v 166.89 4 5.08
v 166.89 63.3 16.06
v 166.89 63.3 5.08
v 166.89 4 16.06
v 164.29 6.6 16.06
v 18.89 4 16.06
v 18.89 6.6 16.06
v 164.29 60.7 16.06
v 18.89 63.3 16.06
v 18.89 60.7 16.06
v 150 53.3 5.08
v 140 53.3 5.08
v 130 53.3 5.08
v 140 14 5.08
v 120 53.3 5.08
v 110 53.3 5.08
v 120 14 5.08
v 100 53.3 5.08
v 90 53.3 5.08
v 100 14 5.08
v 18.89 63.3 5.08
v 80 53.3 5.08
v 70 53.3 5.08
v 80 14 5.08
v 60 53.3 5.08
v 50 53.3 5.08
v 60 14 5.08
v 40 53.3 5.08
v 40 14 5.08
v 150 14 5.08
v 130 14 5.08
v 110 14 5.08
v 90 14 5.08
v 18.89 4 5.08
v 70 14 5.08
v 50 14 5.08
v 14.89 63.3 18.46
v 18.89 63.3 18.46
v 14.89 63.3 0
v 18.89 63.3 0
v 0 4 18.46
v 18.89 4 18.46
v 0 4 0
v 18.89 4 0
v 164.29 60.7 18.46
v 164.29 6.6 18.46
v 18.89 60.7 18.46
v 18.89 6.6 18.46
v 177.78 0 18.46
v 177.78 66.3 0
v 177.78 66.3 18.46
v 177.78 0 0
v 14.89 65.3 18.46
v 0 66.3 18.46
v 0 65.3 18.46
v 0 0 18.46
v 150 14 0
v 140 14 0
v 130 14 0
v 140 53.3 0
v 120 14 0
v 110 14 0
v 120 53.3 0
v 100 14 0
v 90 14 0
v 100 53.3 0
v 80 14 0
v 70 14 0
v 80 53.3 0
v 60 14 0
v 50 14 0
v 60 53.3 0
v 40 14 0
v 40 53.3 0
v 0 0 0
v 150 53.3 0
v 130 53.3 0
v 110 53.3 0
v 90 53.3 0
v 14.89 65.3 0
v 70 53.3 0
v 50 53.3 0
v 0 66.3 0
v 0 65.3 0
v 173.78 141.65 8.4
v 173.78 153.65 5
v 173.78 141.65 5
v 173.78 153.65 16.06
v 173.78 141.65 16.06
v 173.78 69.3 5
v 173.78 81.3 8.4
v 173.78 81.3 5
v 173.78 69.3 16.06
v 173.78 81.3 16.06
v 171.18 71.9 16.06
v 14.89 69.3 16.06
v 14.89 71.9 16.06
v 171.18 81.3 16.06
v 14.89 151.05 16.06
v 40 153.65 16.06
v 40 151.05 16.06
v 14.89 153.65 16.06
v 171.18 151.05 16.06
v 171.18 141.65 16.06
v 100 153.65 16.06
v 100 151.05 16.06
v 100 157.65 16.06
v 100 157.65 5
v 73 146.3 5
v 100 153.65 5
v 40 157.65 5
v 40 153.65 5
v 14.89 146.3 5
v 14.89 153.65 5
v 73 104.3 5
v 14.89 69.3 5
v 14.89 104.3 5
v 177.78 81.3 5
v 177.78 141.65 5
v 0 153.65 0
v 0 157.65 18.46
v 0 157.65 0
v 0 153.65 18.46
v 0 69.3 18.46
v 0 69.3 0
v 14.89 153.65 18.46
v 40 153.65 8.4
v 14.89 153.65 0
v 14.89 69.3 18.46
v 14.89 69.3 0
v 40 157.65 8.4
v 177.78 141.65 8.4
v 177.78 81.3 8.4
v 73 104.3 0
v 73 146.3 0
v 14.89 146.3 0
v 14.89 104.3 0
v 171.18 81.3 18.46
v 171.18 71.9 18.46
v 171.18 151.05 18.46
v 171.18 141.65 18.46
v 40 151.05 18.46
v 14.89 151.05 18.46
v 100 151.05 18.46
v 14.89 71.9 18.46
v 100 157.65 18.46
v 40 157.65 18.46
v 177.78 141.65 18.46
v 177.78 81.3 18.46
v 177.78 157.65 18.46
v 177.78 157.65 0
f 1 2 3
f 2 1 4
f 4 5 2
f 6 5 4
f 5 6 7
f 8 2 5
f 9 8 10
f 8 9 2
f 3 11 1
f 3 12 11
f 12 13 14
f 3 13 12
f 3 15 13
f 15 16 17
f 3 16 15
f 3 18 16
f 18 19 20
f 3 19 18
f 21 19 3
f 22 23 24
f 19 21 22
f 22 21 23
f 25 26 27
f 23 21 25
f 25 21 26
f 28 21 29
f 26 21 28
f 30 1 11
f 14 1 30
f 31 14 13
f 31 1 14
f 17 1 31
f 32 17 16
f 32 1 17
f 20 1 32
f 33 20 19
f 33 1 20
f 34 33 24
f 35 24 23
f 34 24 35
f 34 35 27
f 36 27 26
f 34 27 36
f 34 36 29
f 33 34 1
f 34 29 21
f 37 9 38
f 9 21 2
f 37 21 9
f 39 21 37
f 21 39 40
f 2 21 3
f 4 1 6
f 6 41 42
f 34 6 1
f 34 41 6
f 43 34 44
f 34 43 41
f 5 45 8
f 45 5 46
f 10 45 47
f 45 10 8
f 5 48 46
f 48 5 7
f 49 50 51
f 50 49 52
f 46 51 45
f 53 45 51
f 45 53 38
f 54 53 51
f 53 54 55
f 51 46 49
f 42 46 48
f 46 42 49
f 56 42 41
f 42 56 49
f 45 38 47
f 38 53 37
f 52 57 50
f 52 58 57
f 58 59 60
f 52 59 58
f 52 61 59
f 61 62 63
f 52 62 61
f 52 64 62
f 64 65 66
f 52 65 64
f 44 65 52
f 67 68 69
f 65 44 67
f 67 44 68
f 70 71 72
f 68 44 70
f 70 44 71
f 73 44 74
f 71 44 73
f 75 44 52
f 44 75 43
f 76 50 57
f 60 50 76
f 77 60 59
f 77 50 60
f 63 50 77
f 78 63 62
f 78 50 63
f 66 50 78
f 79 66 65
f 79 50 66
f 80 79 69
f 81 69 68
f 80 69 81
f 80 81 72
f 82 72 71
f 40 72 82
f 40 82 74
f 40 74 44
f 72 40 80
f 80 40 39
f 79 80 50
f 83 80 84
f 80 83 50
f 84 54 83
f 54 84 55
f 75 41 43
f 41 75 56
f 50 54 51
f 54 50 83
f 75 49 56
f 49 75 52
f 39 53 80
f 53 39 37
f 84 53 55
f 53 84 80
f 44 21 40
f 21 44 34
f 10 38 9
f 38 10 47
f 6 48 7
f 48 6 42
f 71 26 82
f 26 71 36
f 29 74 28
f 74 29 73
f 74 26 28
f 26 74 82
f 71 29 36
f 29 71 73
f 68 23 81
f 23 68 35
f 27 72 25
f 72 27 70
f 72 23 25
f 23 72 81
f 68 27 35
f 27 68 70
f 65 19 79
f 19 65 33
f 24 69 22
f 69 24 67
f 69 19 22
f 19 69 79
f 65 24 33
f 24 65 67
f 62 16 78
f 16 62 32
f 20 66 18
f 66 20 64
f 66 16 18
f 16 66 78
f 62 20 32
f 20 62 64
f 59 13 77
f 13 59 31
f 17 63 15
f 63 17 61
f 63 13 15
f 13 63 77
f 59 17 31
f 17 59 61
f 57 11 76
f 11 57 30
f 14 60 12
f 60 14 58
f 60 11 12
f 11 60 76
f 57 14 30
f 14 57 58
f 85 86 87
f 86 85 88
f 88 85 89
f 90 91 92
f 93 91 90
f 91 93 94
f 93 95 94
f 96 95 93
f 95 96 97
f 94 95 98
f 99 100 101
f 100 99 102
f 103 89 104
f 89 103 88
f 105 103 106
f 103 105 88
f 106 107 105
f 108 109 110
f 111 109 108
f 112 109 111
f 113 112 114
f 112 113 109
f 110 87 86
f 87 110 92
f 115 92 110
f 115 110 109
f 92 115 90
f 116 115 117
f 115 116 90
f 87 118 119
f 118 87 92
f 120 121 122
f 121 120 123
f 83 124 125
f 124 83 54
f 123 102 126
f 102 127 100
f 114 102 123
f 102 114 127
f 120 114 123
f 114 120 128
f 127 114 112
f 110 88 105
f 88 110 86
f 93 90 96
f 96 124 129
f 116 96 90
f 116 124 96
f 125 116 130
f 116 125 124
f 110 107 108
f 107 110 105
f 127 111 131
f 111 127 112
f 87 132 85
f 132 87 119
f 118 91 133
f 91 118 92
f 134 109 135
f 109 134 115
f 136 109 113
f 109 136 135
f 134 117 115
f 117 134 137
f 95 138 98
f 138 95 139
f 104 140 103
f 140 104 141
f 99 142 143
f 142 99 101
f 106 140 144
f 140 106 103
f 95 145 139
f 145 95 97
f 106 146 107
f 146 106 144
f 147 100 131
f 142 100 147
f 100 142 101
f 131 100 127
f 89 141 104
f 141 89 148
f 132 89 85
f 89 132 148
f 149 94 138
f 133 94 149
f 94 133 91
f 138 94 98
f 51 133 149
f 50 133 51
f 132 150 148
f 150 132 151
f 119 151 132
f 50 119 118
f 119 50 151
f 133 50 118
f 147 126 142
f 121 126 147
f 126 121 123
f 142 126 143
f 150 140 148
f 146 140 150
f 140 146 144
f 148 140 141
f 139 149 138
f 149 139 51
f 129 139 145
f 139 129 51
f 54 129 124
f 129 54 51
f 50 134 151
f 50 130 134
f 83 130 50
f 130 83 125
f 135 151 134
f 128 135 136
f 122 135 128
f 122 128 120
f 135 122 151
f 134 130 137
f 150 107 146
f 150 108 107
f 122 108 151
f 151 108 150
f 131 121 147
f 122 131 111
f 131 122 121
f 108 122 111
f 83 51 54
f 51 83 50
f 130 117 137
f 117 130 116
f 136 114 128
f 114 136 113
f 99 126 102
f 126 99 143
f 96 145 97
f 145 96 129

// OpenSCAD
MobileWidht = 84.35;
MobileHight = 11.06;
MobileLenght = 173.78;

keybWidth = 59.30;
keybHight = 10.98;
keybLenght = 152;

edgeHolderWidth = 4;
midSeparatorWidth = 6;

holderWidth = MobileLenght+edgeHolderWidth;
minBaseHight = 5;
topOfHolderHight = 2.4;
topOfHolderLenght = 2.6;

//TotalHight is MobileHihgt (cause it is bigger then keyboardHight + minimal base plate hight + HightofholderTop 
totalHight = minBaseHight + MobileHight + topOfHolderHight;



module mockKeyboard() {
    cube([keybLenght,keybWidth,keybHight]);
}

module mockKyebTopCut(){
    cube([keybLenght-2*topOfHolderLenght,keybWidth-2*topOfHolderLenght,keybHight]);    
}

module mockPhone(){
    cube([MobileLenght,MobileWidht,MobileHight]);
    //side buttons, bigger on purpose to cut throuth the edge of the holder
    translate([40,MobileWidht,0])
    cube([60,edgeHolderWidth+1,MobileHight]);
    // charger connector, repro ...
    translate([MobileLenght,12,0])
    cube([edgeHolderWidth+1,MobileWidht-2*12,MobileHight]);
    //Camera
    CameraLenght = 73; //from edge of the phone
    CameraWidth = 42;
    translate([0,35,-10])
    cube([CameraLenght,CameraWidth,10]);    
}

module mockPhoneTopCut() {
    cube([MobileLenght-2*topOfHolderLenght,MobileWidht-2*topOfHolderLenght,MobileHight]);
    //side buttons, bigger on purpose to cut throuth the edge of the holder
    translate([40-topOfHolderLenght,MobileWidht-2*topOfHolderLenght,0])
    cube([60,edgeHolderWidth+1+topOfHolderLenght,MobileHight]);
    // charger connector, repro ...
    translate([MobileLenght-2*topOfHolderLenght,12-topOfHolderLenght,0])
    cube([edgeHolderWidth+1+topOfHolderLenght,MobileWidht-2*12,MobileHight+1]);
}

/*
mockKeyboard();
translate([topOfHolderLenght,topOfHolderLenght,topOfHolderHight+1])
mockKyebTopCut();
*/

/*
mockPhone();
translate([topOfHolderLenght,topOfHolderLenght,topOfHolderHight+1])
mockPhoneTopCut();
*/


//Keyboard Holder
difference(){
  cube([holderWidth,edgeHolderWidth + keybWidth + midSeparatorWidth/2,totalHight]);
  translate([edgeHolderWidth+(MobileLenght-keybLenght)/2,edgeHolderWidth,totalHight-(keybHight+topOfHolderHight)])  
  union() { 
    mockKeyboard();
    translate([topOfHolderLenght,topOfHolderLenght,topOfHolderHight+1])
    mockKyebTopCut();
  }
  //tweaks: remove left parts to allow keyboard to slide in and out;
  translate([-1,edgeHolderWidth,-1])
  cube([1+edgeHolderWidth+(MobileLenght-keybLenght)/2,keybWidth+2,totalHight+2]);
  translate([edgeHolderWidth+(MobileLenght-keybLenght)/2,edgeHolderWidth,-1])
  cube([edgeHolderWidth,keybWidth,totalHight+2]);
  //lightening
  translate([40,edgeHolderWidth+10,-1])
  cube([10,keybWidth-20,totalHight+2]);
  translate([60,edgeHolderWidth+10,-1])
  cube([10,keybWidth-20,totalHight+2]);
  translate([80,edgeHolderWidth+10,-1])
  cube([10,keybWidth-20,totalHight+2]);
  translate([100,edgeHolderWidth+10,-1])
  cube([10,keybWidth-20,totalHight+2]);
  translate([120,edgeHolderWidth+10,-1])
  cube([10,keybWidth-20,totalHight+2]);
  translate([140,edgeHolderWidth+10,-1])
  cube([10,keybWidth-20,totalHight+2]);
}


//Move the Phone holder on Y axe behind the Keyboard Holder
translate([0,edgeHolderWidth + keybWidth + midSeparatorWidth/2,0])
//Phone Holder
difference() {
    cube([holderWidth,midSeparatorWidth/2 + MobileWidht + edgeHolderWidth,totalHight]);
    translate([0,midSeparatorWidth/2,totalHight-(MobileHight+topOfHolderHight)])
    union() {
        mockPhone();
        translate([topOfHolderLenght,topOfHolderLenght,topOfHolderHight+1])
        mockPhoneTopCut();
    }
    //tweaks: remove left parts to allow keyboard to slide in and out;
    translate([-1,midSeparatorWidth/2,-1])
    cube([1+edgeHolderWidth+(MobileLenght-keybLenght)/2,MobileWidht,totalHight+2]);
}
